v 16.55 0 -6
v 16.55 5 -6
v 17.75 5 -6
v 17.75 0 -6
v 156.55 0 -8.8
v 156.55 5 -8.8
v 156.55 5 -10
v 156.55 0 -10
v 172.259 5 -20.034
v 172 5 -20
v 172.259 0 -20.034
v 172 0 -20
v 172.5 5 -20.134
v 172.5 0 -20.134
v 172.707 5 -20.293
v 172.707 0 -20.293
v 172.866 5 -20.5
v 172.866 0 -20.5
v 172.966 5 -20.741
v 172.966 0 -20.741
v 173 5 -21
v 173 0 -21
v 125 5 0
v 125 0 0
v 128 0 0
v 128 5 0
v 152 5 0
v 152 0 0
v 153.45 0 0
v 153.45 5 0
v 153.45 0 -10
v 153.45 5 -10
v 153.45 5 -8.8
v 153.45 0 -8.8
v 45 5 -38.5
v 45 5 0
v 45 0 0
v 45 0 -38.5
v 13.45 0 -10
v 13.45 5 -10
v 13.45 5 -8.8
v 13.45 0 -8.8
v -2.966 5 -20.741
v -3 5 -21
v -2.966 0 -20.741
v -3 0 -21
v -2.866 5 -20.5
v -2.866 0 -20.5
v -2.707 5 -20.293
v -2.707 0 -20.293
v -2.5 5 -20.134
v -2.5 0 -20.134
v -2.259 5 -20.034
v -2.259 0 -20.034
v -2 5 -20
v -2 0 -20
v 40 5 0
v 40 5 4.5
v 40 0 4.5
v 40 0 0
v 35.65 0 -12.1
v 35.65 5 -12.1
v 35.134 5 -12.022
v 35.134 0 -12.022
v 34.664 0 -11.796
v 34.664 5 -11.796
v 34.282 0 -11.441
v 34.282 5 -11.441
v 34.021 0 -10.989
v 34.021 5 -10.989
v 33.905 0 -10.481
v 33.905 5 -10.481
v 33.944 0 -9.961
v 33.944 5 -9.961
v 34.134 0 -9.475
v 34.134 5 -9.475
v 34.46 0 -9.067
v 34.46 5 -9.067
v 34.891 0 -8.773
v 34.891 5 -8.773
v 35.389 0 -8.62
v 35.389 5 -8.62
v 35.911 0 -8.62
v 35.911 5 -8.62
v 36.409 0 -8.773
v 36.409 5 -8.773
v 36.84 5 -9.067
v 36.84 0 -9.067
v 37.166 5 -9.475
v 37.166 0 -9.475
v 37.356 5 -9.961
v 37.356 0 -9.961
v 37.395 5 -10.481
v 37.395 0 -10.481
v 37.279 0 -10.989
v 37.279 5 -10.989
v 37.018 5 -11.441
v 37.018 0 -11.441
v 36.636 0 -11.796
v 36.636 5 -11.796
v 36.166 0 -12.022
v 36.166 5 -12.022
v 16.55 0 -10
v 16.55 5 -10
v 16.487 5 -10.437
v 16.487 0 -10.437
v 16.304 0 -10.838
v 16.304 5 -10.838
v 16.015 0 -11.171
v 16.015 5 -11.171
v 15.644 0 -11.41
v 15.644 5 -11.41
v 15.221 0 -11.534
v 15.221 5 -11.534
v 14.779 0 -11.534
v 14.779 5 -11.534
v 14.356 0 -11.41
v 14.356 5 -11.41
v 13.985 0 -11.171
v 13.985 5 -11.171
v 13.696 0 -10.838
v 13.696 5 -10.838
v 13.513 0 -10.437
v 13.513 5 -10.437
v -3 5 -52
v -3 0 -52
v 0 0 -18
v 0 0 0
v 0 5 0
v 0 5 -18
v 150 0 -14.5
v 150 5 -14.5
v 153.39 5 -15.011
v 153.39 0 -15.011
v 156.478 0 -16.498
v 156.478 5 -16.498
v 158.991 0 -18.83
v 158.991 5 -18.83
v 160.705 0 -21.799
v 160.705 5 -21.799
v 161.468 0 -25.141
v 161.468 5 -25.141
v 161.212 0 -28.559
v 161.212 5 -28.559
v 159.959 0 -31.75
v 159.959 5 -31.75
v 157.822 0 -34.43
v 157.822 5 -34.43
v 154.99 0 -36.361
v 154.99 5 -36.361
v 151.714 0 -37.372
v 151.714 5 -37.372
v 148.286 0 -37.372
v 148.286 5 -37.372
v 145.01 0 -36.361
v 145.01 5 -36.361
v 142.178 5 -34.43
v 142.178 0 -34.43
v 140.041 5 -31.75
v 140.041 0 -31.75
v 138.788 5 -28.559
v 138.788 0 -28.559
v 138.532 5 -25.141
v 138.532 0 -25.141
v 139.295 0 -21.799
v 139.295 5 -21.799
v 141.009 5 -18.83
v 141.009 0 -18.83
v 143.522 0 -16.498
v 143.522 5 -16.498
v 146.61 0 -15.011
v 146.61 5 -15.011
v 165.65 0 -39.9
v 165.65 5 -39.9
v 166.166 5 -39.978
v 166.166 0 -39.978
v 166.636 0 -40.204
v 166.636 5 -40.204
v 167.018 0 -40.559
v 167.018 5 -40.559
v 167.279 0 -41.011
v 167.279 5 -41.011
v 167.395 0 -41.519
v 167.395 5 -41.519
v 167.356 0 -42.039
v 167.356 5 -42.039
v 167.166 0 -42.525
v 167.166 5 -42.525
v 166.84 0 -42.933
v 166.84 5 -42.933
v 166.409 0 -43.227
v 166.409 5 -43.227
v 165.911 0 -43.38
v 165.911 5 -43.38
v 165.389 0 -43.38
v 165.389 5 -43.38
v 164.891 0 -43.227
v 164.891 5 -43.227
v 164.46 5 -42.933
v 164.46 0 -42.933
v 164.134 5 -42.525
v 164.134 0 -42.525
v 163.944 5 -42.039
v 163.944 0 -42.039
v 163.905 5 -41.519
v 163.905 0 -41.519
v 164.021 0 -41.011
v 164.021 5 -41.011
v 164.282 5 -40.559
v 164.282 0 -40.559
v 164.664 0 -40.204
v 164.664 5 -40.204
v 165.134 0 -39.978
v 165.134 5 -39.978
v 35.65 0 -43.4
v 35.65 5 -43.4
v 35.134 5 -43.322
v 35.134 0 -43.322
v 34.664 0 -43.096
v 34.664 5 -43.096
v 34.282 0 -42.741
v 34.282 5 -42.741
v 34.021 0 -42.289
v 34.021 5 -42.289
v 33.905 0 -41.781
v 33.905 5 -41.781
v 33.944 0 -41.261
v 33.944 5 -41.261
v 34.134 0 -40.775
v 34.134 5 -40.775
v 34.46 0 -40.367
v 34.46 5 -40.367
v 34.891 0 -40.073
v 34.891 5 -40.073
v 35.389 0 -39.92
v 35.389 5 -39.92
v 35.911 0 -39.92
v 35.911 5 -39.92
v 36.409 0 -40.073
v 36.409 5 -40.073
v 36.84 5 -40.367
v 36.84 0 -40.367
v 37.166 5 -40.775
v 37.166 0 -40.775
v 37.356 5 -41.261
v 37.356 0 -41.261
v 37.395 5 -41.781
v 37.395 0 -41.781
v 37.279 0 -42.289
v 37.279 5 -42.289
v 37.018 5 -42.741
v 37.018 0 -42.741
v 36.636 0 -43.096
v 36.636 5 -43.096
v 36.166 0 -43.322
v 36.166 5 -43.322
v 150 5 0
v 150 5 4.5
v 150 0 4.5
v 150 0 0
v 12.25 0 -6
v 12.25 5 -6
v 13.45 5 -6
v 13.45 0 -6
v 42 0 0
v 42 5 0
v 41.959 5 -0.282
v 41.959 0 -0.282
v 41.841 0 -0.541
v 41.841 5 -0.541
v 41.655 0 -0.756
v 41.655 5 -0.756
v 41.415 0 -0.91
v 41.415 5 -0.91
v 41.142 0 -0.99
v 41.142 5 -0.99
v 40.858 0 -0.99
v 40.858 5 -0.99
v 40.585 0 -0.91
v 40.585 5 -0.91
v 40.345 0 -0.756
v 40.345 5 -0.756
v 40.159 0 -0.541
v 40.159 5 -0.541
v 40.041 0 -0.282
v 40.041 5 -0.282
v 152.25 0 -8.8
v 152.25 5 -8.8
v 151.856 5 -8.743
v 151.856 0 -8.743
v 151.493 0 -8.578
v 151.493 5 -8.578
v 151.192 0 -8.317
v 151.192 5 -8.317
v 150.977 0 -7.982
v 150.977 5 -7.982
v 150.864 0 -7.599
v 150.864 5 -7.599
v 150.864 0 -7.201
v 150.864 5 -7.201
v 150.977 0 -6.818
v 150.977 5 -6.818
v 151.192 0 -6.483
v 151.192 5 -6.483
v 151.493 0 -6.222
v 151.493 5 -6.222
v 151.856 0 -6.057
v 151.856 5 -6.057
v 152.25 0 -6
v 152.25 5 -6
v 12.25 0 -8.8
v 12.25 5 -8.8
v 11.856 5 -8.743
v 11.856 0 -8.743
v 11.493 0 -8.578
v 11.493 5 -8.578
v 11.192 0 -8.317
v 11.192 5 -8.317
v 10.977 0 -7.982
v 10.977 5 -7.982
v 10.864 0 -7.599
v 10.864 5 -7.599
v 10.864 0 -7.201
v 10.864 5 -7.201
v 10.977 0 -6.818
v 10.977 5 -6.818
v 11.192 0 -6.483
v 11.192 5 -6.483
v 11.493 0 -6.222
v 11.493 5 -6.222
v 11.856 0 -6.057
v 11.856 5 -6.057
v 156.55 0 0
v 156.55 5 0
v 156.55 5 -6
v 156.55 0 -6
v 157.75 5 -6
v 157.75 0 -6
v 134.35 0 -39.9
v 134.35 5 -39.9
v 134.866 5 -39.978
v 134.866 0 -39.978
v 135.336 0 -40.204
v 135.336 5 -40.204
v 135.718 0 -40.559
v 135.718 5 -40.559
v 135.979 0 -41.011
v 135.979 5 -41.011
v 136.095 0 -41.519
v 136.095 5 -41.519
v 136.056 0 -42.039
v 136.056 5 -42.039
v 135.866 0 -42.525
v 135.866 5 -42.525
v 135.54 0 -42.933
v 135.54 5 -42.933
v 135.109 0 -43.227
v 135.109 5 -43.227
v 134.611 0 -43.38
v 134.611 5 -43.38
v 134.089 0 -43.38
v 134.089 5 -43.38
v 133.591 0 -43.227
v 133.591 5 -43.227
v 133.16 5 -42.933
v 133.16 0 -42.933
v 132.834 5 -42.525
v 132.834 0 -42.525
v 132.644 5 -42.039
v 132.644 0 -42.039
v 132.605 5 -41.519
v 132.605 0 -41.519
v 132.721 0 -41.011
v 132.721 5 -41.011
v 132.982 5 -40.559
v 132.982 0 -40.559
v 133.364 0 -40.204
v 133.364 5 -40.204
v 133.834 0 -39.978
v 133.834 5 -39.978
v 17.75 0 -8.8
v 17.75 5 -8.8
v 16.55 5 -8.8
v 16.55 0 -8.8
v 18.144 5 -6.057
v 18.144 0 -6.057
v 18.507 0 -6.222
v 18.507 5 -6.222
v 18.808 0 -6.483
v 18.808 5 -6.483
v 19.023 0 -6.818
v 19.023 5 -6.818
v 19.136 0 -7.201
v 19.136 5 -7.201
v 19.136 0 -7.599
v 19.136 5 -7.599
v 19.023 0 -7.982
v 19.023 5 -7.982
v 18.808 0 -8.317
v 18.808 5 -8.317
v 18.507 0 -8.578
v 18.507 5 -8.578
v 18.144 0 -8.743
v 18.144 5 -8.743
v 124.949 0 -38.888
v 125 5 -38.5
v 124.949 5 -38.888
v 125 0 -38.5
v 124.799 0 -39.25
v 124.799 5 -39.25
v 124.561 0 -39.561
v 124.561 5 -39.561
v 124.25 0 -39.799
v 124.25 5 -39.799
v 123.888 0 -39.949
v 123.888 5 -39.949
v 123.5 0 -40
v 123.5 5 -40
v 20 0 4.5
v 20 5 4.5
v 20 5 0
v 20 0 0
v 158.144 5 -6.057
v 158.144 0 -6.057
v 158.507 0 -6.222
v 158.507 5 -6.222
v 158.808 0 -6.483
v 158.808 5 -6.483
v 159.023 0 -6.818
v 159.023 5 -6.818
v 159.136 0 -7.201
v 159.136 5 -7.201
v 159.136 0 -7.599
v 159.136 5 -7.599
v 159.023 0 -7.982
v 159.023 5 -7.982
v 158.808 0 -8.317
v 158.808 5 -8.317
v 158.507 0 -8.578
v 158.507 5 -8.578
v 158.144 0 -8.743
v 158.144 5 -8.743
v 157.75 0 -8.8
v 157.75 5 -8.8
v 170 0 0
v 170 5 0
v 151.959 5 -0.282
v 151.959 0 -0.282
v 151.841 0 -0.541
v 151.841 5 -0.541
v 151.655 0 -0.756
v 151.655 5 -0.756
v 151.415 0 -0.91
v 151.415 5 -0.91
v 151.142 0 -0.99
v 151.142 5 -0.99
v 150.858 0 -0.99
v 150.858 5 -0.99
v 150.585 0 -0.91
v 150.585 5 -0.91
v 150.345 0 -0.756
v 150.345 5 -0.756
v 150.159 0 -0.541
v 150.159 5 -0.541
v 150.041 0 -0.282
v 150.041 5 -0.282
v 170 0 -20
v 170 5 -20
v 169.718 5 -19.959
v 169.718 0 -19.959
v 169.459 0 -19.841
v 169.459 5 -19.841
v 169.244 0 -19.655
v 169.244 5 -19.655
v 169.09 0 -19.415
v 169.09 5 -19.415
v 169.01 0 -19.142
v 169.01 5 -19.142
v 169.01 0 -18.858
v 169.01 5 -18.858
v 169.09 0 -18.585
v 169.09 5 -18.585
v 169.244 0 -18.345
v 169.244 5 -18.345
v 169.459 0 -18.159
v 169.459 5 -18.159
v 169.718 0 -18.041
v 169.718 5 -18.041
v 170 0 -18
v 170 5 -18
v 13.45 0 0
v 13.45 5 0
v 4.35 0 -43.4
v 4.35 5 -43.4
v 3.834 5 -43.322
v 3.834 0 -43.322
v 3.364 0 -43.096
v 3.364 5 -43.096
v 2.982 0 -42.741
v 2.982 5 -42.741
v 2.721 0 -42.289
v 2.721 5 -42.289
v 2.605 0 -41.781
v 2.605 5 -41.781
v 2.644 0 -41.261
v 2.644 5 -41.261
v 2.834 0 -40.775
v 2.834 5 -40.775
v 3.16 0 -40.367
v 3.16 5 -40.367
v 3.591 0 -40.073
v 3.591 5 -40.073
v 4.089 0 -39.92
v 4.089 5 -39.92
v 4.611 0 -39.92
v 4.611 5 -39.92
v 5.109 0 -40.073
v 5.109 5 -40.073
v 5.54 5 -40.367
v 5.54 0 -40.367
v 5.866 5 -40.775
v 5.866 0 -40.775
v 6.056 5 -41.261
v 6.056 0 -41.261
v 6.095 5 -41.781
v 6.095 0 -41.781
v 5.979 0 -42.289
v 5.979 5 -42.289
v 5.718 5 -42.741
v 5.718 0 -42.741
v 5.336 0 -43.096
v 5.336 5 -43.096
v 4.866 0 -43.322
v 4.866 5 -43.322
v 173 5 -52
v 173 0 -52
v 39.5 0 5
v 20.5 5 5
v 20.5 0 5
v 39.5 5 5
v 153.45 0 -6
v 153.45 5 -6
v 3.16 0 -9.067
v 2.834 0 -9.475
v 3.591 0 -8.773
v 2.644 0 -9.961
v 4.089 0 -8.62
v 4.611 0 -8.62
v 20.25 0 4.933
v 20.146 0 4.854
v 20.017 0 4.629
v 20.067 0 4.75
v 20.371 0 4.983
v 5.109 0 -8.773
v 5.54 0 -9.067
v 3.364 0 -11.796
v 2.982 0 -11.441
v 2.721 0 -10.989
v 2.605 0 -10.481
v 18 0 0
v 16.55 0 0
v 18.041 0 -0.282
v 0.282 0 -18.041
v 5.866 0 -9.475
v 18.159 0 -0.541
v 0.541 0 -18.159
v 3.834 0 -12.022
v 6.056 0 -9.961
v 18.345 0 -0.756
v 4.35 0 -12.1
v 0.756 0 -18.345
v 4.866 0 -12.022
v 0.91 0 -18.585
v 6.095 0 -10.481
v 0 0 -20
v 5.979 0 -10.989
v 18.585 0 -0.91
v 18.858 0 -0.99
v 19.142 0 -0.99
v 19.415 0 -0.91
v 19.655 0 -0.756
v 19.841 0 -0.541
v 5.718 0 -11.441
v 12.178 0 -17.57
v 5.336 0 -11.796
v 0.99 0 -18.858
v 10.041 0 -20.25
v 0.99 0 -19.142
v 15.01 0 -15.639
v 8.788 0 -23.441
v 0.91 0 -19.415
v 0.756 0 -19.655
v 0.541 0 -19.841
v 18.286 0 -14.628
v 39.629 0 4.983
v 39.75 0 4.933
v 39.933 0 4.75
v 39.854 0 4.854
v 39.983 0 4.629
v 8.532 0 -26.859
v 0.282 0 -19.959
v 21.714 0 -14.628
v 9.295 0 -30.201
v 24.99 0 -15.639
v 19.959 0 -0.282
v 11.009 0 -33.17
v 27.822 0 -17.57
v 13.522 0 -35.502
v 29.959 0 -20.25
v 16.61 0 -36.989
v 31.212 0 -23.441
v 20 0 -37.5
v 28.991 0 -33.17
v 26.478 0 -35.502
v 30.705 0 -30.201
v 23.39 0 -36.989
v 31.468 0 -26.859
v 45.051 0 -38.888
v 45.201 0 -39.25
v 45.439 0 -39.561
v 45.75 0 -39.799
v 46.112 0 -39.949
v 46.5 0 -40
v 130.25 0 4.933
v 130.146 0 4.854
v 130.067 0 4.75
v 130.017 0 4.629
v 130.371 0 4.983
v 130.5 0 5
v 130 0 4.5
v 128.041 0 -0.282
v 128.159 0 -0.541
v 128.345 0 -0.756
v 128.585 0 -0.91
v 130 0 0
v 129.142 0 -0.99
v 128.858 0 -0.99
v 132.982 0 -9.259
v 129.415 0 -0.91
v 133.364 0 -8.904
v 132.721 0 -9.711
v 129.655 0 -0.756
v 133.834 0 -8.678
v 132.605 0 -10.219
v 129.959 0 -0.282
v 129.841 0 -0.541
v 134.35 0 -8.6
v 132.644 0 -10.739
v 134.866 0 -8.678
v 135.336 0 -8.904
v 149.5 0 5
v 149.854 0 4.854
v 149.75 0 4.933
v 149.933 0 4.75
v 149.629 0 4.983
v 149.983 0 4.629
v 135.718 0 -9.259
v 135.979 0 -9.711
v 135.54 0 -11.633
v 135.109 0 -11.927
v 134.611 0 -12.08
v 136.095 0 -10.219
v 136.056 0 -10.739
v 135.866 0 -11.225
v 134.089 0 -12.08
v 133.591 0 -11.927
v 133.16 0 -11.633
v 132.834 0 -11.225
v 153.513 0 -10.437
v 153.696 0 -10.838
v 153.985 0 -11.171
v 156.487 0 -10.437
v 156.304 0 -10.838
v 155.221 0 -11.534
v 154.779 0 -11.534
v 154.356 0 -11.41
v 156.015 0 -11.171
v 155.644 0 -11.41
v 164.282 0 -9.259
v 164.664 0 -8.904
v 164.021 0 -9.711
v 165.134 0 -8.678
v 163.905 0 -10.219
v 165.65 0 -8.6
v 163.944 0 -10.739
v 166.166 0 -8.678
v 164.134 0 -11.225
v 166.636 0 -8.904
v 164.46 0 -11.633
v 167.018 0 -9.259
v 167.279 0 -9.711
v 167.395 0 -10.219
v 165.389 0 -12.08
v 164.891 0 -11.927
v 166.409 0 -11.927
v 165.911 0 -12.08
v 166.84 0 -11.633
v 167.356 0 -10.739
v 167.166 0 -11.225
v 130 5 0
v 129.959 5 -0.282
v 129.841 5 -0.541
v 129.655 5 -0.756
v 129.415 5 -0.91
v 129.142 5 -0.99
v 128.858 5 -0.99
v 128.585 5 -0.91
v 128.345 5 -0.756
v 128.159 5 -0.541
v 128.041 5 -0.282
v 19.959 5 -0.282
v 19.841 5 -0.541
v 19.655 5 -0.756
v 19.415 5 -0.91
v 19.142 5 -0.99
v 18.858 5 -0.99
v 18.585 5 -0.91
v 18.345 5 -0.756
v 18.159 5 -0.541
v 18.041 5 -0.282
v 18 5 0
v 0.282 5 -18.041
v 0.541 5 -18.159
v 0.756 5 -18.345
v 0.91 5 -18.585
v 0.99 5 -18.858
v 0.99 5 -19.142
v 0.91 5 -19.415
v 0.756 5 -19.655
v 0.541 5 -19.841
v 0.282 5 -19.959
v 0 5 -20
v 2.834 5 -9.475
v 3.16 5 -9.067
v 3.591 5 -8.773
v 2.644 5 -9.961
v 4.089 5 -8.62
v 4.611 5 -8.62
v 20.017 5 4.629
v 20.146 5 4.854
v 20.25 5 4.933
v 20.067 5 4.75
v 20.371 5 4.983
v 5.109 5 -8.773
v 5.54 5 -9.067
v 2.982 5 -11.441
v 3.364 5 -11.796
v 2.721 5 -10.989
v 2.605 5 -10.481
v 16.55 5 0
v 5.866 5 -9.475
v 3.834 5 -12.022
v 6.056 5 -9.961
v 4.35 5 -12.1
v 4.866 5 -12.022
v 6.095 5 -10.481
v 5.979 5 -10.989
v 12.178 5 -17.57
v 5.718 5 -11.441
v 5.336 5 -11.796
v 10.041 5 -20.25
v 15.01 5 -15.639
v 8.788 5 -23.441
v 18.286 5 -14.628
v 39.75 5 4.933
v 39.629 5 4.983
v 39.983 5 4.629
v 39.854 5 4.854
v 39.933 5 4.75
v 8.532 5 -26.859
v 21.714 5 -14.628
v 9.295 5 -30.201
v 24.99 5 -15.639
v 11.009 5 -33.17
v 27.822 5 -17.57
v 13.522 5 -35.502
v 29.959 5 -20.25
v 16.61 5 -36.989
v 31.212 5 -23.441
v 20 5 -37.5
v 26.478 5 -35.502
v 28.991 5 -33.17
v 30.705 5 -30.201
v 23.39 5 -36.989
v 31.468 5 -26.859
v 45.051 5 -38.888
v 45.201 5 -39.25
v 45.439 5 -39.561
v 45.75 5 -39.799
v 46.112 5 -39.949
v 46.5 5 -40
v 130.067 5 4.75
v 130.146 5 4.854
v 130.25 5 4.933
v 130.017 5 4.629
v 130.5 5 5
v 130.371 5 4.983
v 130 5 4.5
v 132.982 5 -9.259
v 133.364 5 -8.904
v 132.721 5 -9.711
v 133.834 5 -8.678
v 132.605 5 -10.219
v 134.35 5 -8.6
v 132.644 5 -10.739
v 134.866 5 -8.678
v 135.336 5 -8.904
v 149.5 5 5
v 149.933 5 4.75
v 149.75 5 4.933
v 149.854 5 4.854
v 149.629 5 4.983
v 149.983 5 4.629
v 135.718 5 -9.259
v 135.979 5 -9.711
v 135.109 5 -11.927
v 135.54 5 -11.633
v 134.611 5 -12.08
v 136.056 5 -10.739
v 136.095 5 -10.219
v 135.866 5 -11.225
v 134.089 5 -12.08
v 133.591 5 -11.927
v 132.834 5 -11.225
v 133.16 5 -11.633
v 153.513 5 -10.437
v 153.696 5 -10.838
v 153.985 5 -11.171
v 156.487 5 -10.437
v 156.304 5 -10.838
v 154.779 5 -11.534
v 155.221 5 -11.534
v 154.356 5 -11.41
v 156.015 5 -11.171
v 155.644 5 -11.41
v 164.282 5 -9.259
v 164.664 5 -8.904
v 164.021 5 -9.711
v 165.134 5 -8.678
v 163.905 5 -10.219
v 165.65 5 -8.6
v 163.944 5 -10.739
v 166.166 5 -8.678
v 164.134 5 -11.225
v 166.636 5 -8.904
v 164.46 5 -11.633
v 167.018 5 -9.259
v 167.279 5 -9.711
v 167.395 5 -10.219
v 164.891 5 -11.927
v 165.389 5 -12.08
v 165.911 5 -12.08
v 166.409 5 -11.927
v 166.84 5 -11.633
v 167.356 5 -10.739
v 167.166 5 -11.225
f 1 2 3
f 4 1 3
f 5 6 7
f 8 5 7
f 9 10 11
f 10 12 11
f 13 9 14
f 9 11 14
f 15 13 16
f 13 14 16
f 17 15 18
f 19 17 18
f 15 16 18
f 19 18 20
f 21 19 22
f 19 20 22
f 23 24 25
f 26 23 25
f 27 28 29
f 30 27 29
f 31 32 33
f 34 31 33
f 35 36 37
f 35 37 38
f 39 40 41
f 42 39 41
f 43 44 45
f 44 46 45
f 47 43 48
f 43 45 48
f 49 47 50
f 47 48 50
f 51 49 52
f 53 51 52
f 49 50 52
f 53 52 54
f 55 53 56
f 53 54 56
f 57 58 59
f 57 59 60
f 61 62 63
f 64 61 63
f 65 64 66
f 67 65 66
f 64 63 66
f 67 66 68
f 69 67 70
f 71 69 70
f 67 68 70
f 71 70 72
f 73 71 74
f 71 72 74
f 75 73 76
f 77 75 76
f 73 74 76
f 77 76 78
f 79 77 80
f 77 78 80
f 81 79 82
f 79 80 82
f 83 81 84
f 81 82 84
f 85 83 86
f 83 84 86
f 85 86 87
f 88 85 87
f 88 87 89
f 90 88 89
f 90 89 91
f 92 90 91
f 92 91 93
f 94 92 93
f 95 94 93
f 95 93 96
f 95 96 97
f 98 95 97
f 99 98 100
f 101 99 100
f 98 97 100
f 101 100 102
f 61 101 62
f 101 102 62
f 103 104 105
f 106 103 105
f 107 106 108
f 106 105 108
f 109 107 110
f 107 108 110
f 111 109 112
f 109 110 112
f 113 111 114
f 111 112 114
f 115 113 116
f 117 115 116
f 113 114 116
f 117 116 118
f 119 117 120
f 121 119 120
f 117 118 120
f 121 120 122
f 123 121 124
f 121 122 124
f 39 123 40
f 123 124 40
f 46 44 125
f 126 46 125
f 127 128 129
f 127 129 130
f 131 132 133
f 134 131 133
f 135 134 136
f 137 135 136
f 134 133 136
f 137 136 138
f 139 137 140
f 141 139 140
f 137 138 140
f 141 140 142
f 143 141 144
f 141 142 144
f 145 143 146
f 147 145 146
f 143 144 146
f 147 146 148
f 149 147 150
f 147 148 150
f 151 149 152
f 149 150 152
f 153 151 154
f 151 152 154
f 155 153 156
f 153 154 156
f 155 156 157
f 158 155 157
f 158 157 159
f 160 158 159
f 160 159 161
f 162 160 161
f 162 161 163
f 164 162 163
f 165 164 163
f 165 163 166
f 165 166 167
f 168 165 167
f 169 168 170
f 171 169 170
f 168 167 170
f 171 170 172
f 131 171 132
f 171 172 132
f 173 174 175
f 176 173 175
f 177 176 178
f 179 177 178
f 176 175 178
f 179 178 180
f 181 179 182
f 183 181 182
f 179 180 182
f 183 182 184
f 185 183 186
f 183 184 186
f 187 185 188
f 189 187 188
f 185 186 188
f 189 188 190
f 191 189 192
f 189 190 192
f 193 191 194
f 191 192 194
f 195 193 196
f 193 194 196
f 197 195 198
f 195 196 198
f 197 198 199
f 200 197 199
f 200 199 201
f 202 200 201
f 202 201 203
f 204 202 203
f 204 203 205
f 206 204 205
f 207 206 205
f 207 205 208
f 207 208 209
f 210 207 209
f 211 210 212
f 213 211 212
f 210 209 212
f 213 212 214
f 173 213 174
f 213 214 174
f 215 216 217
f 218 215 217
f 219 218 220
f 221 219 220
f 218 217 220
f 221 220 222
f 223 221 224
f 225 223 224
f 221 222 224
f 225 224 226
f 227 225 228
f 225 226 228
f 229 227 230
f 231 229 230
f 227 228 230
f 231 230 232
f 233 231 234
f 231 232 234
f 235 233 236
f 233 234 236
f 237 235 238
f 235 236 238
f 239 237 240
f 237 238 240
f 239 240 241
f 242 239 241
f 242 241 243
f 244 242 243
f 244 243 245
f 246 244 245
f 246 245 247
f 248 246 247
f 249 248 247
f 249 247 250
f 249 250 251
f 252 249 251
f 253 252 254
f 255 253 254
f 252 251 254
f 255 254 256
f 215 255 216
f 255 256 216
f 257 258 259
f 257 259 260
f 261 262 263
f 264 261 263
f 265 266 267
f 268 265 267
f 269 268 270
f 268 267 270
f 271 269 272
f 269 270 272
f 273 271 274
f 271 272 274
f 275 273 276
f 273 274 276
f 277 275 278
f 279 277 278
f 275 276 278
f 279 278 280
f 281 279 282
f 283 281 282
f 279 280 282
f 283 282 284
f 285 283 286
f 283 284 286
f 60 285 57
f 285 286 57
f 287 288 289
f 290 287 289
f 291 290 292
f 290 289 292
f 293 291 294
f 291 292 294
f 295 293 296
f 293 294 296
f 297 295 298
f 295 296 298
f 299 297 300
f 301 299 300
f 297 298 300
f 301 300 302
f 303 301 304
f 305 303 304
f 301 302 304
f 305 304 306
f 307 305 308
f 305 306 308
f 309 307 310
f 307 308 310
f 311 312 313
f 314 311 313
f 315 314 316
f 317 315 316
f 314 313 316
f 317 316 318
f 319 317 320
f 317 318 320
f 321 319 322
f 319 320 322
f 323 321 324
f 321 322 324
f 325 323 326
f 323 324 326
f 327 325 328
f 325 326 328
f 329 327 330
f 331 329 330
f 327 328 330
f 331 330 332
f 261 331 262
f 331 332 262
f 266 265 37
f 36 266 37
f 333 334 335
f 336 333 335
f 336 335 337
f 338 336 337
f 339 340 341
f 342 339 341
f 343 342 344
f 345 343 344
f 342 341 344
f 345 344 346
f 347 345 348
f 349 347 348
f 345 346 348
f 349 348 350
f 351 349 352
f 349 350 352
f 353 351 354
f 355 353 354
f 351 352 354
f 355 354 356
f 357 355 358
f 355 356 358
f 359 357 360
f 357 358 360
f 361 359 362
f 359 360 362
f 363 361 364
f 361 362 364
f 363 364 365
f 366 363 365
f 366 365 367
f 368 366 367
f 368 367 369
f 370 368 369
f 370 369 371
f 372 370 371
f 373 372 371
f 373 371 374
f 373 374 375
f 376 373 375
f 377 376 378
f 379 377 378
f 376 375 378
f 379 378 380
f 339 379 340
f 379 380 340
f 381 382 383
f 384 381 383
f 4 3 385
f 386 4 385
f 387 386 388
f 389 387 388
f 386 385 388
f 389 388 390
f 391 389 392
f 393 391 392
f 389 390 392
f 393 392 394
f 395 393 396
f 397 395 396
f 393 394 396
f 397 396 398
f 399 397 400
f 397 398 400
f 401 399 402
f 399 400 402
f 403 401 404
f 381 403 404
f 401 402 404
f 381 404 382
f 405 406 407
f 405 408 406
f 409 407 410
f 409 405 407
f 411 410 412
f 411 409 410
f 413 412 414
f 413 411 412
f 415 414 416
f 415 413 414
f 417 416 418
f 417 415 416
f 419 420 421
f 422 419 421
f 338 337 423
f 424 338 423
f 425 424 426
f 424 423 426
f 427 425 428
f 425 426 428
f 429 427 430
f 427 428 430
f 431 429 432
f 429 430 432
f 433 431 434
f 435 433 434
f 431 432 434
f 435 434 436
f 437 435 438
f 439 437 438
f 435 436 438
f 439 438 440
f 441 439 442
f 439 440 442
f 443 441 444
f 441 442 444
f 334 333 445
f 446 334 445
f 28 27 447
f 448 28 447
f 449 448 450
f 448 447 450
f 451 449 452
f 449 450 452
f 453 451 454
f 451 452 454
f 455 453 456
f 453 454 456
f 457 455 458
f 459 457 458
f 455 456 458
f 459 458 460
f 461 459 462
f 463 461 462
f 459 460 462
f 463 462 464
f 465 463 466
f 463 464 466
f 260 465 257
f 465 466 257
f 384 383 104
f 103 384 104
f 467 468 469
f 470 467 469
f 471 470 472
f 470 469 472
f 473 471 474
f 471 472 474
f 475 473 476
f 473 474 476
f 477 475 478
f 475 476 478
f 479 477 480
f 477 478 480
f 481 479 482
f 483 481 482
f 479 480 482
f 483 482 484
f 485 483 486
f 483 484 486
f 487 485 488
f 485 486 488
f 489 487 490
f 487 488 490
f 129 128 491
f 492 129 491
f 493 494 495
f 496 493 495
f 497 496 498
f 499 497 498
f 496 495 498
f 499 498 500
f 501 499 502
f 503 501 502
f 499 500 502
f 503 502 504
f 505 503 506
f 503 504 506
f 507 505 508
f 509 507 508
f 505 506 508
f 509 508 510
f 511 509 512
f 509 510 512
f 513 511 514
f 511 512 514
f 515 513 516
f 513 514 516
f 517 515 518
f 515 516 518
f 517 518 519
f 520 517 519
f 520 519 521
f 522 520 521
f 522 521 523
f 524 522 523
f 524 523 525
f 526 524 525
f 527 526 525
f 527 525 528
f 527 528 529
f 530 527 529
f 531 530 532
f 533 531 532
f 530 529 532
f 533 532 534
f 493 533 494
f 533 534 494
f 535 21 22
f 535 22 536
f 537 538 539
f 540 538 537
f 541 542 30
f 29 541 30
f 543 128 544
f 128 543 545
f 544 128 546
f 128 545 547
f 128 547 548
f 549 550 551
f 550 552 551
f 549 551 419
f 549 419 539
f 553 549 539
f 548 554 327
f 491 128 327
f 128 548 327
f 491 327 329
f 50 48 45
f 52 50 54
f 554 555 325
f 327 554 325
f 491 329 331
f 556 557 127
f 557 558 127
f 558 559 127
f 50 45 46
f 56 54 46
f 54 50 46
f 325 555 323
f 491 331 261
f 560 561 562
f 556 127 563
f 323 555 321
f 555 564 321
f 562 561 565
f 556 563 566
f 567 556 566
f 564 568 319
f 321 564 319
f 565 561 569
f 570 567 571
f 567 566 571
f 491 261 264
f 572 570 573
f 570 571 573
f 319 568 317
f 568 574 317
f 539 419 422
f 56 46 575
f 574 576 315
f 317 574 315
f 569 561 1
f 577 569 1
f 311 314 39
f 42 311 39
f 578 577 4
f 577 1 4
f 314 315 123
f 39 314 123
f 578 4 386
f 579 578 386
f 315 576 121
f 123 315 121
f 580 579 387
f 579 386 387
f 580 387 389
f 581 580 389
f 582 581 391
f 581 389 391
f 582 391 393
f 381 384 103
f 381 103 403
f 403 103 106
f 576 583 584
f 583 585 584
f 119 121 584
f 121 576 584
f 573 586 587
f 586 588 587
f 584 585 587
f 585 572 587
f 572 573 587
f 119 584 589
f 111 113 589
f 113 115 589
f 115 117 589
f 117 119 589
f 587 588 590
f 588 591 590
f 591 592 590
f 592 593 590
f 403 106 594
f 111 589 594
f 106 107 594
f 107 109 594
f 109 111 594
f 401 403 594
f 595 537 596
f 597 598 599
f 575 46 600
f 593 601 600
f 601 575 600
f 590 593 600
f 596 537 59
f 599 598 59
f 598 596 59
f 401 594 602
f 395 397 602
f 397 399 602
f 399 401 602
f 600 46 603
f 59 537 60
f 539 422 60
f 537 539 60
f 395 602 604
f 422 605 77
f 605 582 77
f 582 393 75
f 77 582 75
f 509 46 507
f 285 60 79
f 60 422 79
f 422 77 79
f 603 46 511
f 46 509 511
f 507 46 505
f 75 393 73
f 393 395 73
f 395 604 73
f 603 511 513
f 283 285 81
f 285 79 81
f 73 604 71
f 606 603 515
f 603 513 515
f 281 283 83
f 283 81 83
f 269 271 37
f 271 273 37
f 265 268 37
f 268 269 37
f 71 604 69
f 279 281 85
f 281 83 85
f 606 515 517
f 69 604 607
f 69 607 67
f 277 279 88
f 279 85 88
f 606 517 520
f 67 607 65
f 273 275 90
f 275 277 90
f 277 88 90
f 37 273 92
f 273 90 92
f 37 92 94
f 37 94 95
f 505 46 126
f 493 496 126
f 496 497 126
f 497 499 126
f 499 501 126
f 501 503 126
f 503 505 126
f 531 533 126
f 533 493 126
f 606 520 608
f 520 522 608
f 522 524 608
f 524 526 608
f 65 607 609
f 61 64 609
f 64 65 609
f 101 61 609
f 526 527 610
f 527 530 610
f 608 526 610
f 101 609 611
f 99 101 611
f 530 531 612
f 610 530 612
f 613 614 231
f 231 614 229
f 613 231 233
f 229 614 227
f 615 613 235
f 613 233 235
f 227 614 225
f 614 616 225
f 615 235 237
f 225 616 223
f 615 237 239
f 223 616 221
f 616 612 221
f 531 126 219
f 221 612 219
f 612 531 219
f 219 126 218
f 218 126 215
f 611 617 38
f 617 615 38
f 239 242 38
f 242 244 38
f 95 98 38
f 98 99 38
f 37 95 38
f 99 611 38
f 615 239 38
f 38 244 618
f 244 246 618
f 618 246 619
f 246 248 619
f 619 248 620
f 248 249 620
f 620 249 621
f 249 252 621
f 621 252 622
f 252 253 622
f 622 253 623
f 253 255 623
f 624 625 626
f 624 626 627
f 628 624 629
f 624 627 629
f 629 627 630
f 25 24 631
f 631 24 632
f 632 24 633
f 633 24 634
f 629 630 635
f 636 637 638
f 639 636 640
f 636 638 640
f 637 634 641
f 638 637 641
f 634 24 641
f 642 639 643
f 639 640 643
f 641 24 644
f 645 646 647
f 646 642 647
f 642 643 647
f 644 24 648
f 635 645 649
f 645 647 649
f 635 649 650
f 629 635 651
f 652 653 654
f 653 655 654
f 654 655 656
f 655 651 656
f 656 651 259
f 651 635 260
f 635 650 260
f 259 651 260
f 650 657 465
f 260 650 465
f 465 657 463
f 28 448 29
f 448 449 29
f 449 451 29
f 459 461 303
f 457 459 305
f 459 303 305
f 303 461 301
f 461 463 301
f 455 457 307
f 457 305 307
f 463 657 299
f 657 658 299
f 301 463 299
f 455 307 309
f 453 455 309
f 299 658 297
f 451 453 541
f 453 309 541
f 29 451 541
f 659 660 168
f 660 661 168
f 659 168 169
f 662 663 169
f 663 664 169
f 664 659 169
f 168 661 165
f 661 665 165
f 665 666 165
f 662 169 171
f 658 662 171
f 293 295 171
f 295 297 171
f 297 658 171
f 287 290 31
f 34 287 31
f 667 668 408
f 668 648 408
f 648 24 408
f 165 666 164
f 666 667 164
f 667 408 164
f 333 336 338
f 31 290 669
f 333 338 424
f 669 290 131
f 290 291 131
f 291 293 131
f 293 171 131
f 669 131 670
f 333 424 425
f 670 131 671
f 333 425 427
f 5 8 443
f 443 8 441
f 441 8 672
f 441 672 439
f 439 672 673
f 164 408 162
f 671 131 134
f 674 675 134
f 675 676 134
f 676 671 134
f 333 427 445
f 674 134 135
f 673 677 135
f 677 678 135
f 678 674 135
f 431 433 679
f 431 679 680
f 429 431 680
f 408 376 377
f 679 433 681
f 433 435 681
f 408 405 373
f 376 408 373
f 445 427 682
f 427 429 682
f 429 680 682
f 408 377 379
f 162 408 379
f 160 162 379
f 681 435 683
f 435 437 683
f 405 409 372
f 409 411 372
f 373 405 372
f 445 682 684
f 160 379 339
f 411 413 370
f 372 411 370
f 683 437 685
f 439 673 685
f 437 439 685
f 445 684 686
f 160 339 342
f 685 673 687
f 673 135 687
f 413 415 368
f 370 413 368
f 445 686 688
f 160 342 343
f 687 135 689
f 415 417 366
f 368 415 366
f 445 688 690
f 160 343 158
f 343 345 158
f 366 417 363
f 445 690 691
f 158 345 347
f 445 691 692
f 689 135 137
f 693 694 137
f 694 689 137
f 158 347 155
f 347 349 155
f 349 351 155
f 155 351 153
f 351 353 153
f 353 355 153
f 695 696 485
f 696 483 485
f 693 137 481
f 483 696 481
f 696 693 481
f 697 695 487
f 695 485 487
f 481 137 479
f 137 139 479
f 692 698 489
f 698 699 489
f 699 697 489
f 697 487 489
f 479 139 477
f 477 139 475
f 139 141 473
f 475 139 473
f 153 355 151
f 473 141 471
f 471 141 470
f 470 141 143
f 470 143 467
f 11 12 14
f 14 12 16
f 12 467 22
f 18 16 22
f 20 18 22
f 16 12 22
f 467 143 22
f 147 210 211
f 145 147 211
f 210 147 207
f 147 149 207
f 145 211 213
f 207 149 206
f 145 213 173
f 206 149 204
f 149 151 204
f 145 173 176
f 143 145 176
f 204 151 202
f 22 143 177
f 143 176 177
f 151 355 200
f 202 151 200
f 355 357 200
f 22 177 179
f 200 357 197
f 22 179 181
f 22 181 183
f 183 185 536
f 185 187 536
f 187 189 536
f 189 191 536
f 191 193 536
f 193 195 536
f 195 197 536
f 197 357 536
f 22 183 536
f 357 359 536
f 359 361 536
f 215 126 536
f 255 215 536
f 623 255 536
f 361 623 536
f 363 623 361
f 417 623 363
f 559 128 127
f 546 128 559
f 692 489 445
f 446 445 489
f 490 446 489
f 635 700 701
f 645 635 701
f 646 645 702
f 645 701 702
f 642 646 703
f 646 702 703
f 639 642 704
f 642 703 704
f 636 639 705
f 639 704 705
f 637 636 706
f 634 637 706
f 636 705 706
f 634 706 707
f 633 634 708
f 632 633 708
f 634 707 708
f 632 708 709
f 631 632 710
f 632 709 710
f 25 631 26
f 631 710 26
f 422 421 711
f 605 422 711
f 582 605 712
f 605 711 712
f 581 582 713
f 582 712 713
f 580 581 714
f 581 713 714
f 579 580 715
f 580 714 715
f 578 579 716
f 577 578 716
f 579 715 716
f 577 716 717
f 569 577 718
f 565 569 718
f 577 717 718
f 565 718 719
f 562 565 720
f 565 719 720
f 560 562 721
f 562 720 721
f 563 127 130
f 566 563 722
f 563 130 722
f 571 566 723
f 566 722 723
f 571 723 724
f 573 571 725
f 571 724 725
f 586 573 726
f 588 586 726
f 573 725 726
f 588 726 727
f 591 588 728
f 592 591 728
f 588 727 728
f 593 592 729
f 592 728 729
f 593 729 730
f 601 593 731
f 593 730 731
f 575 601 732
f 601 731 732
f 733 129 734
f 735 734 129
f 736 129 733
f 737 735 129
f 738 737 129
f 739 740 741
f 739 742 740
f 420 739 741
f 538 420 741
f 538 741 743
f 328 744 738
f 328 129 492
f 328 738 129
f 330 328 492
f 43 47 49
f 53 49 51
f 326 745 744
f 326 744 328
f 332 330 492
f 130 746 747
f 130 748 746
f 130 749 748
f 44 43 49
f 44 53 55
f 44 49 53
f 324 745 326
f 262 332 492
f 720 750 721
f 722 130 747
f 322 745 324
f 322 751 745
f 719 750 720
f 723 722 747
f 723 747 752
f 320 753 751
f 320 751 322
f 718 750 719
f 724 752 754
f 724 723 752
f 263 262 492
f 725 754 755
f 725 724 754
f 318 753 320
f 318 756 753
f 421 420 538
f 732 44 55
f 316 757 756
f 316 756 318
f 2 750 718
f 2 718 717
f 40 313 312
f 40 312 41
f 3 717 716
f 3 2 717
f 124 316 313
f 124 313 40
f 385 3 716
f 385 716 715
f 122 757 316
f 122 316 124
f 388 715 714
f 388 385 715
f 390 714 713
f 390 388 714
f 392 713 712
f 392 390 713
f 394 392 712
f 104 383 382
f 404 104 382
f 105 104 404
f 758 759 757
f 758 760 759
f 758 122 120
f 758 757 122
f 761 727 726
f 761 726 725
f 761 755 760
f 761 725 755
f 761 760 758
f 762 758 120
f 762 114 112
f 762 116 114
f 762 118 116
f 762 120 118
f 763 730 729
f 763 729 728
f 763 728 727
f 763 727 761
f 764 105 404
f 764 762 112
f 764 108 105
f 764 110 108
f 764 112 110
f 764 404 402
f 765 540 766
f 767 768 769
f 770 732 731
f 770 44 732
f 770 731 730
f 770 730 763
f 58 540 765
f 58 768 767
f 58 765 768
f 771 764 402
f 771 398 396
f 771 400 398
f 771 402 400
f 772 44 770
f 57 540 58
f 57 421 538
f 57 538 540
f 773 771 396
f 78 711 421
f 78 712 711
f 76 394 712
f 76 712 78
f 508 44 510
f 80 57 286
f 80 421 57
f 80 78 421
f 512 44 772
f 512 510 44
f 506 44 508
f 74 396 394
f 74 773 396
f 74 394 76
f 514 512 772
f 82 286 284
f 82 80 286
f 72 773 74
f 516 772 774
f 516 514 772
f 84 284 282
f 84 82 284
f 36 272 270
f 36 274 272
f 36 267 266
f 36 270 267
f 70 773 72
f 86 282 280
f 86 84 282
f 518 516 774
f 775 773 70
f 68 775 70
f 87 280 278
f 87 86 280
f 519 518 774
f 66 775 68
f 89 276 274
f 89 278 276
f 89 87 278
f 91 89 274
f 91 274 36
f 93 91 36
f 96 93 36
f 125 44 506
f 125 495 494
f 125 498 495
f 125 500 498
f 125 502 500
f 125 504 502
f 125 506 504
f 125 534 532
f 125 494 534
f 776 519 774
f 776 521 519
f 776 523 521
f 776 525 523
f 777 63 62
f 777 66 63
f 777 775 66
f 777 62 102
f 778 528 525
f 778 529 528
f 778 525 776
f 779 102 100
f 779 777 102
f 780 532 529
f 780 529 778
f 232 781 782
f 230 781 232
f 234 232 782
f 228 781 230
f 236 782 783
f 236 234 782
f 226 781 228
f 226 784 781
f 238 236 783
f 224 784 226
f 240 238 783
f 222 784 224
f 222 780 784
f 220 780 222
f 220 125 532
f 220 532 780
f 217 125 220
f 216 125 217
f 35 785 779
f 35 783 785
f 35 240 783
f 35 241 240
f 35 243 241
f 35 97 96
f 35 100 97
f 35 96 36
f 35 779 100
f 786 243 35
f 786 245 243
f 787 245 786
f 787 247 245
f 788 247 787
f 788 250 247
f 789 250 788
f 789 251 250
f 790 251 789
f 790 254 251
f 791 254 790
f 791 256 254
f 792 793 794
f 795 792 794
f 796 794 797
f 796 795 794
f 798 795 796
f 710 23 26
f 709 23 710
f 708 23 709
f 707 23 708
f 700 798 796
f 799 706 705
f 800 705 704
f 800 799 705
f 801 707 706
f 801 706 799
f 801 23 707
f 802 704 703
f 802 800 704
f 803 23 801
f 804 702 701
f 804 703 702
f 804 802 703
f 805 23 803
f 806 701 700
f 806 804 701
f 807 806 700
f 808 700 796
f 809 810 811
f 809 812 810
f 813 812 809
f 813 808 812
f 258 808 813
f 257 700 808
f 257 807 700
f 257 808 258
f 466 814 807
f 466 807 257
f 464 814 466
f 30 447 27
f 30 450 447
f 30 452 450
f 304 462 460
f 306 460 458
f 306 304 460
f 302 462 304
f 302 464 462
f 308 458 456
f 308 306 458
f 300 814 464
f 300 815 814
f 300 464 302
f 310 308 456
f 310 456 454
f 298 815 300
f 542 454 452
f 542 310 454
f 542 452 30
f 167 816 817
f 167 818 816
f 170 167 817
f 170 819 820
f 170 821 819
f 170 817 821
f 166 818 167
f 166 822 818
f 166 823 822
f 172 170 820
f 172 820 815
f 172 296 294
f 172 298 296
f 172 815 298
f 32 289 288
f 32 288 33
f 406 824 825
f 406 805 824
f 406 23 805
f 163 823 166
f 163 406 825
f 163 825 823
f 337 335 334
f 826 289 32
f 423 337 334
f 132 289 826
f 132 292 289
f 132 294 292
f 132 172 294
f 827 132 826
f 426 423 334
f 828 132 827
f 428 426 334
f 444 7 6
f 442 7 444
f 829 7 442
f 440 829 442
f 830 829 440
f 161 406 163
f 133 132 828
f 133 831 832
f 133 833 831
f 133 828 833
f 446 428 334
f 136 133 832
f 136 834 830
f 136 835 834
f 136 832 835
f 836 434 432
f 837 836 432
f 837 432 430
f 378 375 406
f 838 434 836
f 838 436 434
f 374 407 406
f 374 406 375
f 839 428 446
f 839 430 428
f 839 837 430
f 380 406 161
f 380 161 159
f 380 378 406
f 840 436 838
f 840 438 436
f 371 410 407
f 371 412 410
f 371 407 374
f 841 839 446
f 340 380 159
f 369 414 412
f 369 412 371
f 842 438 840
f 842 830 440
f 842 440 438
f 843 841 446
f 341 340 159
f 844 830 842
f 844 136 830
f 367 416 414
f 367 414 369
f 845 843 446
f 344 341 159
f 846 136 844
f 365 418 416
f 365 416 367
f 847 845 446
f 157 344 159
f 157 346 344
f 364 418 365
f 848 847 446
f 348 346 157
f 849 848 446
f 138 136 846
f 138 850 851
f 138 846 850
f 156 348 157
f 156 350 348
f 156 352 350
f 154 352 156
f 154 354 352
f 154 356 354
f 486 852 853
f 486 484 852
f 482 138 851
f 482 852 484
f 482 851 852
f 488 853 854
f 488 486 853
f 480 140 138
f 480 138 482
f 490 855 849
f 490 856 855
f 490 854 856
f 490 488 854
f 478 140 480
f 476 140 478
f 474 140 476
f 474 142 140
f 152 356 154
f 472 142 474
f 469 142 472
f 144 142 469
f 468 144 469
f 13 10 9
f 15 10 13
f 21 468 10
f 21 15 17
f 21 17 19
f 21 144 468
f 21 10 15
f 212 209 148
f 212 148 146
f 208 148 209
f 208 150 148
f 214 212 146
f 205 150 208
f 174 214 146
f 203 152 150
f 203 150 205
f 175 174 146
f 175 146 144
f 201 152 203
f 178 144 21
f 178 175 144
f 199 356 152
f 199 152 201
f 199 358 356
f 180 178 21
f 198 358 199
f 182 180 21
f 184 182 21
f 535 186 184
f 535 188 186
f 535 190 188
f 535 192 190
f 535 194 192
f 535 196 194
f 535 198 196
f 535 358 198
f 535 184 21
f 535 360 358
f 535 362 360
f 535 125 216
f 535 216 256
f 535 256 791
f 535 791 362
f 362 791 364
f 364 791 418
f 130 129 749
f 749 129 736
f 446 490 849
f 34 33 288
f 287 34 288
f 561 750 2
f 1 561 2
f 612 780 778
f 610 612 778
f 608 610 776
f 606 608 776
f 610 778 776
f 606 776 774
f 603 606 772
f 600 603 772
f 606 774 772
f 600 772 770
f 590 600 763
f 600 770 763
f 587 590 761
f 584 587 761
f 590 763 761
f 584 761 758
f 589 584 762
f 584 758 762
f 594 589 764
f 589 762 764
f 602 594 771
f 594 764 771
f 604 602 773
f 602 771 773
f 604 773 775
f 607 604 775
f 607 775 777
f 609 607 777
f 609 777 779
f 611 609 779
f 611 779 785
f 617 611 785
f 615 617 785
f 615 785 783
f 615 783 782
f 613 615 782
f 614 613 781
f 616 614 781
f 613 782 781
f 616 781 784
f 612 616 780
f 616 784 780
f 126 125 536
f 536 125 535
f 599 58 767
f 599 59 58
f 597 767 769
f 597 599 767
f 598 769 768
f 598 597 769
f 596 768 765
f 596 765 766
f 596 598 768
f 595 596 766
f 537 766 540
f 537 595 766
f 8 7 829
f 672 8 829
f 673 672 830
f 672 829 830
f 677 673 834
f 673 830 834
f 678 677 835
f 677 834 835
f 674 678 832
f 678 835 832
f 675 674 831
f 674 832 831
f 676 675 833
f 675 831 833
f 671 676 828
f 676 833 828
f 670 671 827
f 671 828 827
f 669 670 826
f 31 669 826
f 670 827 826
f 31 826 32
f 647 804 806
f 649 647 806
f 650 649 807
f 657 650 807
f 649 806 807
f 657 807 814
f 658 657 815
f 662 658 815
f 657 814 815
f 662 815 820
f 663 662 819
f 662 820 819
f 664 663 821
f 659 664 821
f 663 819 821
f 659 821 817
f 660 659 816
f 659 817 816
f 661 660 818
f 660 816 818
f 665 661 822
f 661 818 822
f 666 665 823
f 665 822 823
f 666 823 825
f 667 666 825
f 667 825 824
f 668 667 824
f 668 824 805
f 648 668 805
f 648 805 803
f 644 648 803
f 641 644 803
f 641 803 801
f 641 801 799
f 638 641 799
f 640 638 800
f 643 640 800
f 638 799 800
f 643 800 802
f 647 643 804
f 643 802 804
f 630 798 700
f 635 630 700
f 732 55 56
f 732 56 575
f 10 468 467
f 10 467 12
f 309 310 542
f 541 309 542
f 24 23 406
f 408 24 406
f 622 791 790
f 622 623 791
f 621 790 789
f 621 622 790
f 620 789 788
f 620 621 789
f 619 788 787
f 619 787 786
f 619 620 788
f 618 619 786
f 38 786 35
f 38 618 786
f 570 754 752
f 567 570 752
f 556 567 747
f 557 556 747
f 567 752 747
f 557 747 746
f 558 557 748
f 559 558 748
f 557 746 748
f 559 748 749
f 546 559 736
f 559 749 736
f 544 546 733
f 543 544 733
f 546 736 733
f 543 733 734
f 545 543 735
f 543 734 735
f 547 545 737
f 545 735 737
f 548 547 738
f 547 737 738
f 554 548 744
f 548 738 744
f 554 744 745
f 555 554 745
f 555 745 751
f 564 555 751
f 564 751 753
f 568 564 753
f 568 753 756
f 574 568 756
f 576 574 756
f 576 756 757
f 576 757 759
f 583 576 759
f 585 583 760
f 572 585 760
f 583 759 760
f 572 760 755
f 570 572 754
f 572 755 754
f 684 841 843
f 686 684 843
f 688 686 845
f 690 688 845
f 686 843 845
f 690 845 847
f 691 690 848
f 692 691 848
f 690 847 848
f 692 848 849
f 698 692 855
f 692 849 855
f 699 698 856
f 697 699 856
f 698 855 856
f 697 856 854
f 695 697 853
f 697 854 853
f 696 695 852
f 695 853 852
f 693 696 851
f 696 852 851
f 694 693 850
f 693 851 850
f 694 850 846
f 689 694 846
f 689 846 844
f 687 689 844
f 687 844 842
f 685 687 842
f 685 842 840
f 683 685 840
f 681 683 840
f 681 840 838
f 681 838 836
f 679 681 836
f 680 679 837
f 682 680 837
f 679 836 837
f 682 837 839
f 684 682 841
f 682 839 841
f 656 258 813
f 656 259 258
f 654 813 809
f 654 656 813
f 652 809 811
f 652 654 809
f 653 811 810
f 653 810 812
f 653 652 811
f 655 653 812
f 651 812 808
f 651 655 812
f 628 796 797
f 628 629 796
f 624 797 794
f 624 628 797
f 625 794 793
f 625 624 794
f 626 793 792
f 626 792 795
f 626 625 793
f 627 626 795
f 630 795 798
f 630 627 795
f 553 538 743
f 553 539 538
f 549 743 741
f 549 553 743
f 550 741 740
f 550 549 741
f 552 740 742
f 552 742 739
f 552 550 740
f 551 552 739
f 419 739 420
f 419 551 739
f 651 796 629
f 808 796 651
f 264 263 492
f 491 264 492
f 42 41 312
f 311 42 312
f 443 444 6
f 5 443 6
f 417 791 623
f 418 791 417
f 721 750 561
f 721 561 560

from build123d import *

# Parameters (mm, degrees)
SKETCH_1_W          = 170
SKETCH_1_H          = 52
EXTRUDE_1_DEPTH     = 5
SKETCH_2_R          = 11.5
SKETCH_2_R_2        = 1.75
CUT_EXTRUDE_1_DEPTH = 5
SKETCH_3_W          = 20
SKETCH_3_H          = 5
EXTRUDE_2_DEPTH     = 5
SKETCH_4_R          = 1
CUT_EXTRUDE_2_DEPTH = 5
CUT_EXTRUDE_3_DEPTH = 10
FILLET_1_R          = 0.5
SKETCH_7_W          = 3
SKETCH_7_H          = 32
EXTRUDE_3_DEPTH     = 5
SKETCH_8_R          = 1
CUT_EXTRUDE_5_DEPTH = 5
SKETCH_9_W          = 80
SKETCH_9_H          = 40
CUT_EXTRUDE_6_DEPTH = 10
FILLET_2_R          = 1.5
FILLET_3_R          = 1


with BuildPart() as part:
    # 스케치1 → 보스-돌출1 (new body)
    with BuildSketch(Plane(origin=(0, 0, 0), x_dir=(1, 0, 0), z_dir=(0, 1, 0))):
        with Locations((85, 26)):
            Rectangle(SKETCH_1_W, SKETCH_1_H)
    extrude(amount=EXTRUDE_1_DEPTH)

    # 스케치2 → 컷-돌출1 (cut)
    with BuildSketch(Plane(origin=(0, 5, 0), x_dir=(1, 0, 0), z_dir=(0, 1, 0))):
        with Locations(Location((150, 26, 0), (0, 0, 270))):
            Circle(SKETCH_2_R)
        with Locations(Location((165.65, 41.65, 0), (0, 0, 270))):
            Circle(SKETCH_2_R_2)
        with Locations(Location((134.35, 41.65, 0), (0, 0, 270))):
            Circle(SKETCH_2_R_2)
        with Locations(Location((165.65, 10.35, 0), (0, 0, 270))):
            Circle(SKETCH_2_R_2)
        with Locations(Location((134.35, 10.35, 0), (0, 0, 270))):
            Circle(SKETCH_2_R_2)
        with Locations(Location((35.65, 10.35, 0), (0, 0, 90))):
            Circle(SKETCH_2_R_2)
        with Locations(Location((4.35, 10.35, 0), (0, 0, 90))):
            Circle(SKETCH_2_R_2)
        with Locations(Location((35.65, 41.65, 0), (0, 0, 90))):
            Circle(SKETCH_2_R_2)
        with Locations(Location((4.35, 41.65, 0), (0, 0, 90))):
            Circle(SKETCH_2_R_2)
        with Locations(Location((20, 26, 0), (0, 0, 90))):
            Circle(SKETCH_2_R)
    extrude(amount=-CUT_EXTRUDE_1_DEPTH, mode=Mode.SUBTRACT)

    # 스케치3 → 보스-돌출2 (add)
    with BuildSketch(Plane(origin=(0, 5, 0), x_dir=(1, 0, 0), z_dir=(0, 1, 0))):
        with Locations((140, -2.5)):
            Rectangle(SKETCH_3_W, SKETCH_3_H)
        with Locations((30, -2.5)):
            Rectangle(SKETCH_3_W, SKETCH_3_H)
    extrude(amount=-EXTRUDE_2_DEPTH)

    # 스케치4 → 컷-돌출2 (cut)
    with BuildSketch(Plane(origin=(0, 5, 0), x_dir=(1, 0, 0), z_dir=(0, 1, 0))):
        with Locations((129, 0)):
            Circle(SKETCH_4_R)
        with Locations((151, 0)):
            Circle(SKETCH_4_R)
        with Locations((19, 0)):
            Circle(SKETCH_4_R)
        with Locations((41, 0)):
            Circle(SKETCH_4_R)
    extrude(amount=-CUT_EXTRUDE_2_DEPTH, mode=Mode.SUBTRACT)

    # 스케치5 → 컷-돌출3 (cut)
    with BuildSketch(Plane(origin=(0, 5, 0), x_dir=(1, 0, 0), z_dir=(0, 1, 0))):
        with BuildLine():
            Line((156.55, 0), (156.55, 6))
            Line((156.55, 6), (157.75, 6))
            ThreePointArc((157.75, 6), (159.15, 7.4), (157.75, 8.8))
            Line((157.75, 8.8), (156.55, 8.8))
            Line((156.55, 8.8), (156.55, 10))
            ThreePointArc((156.55, 10), (155, 11.55), (153.45, 10))
            Line((153.45, 10), (153.45, 8.8))
            Line((153.45, 8.8), (152.25, 8.8))
            ThreePointArc((152.25, 8.8), (150.85, 7.4), (152.25, 6))
            Line((152.25, 6), (153.45, 6))
            Line((153.45, 6), (153.45, 0))
            Line((153.45, 0), (156.55, 0))
        make_face()
        with BuildLine():
            Line((12.25, 6), (13.45, 6))
            Line((13.45, 6), (13.45, 0))
            Line((13.45, 0), (16.55, 0))
            Line((16.55, 0), (16.55, 6))
            Line((16.55, 6), (17.75, 6))
            ThreePointArc((17.75, 6), (19.15, 7.4), (17.75, 8.8))
            Line((17.75, 8.8), (16.55, 8.8))
            Line((16.55, 8.8), (16.55, 10))
            ThreePointArc((16.55, 10), (15, 11.55), (13.45, 10))
            Line((13.45, 10), (13.45, 8.8))
            Line((13.45, 8.8), (12.25, 8.8))
            ThreePointArc((12.25, 8.8), (10.85, 7.4), (12.25, 6))
        make_face()
    extrude(amount=-CUT_EXTRUDE_3_DEPTH, mode=Mode.SUBTRACT)

    # 필렛1
    fillet_1_edges = [part.edges().sort_by_distance(p)[0] for p in [
        (20, 2.5, 5),
        (130, 2.5, 5),
        (150, 2.5, 5),
        (40, 2.5, 5),
    ]]
    fillet(fillet_1_edges, radius=FILLET_1_R)

    # 스케치7 → 보스-돌출3 (add)
    with BuildSketch(Plane(origin=(0, 5, 0), x_dir=(1, 0, 0), z_dir=(0, 1, 0))):
        with Locations((171.5, 36)):
            Rectangle(SKETCH_7_W, SKETCH_7_H)
        with Locations((-1.5, 36)):
            Rectangle(SKETCH_7_W, SKETCH_7_H)
    extrude(amount=-EXTRUDE_3_DEPTH)

    # 스케치8 → 컷-돌출5 (cut)
    with BuildSketch(Plane(origin=(0, 5, 0), x_dir=(1, 0, 0), z_dir=(0, 1, 0))):
        with Locations((170, 19)):
            Circle(SKETCH_8_R)
        with Locations((0, 19)):
            Circle(SKETCH_8_R)
    extrude(amount=-CUT_EXTRUDE_5_DEPTH, mode=Mode.SUBTRACT)

    # 스케치9 → 컷-돌출6 (cut)
    with BuildSketch(Plane(origin=(0, 5, 0), x_dir=(1, 0, 0), z_dir=(0, 1, 0))):
        with Locations((85, 20)):
            Rectangle(SKETCH_9_W, SKETCH_9_H)
    extrude(amount=-CUT_EXTRUDE_6_DEPTH, mode=Mode.SUBTRACT)

    # 필렛2
    fillet_2_edges = [part.edges().sort_by_distance(p)[0] for p in [
        (125, 2.5, -40),
        (45, 2.5, -40),
    ]]
    fillet(fillet_2_edges, radius=FILLET_2_R)

    # 필렛3
    fillet_3_edges = [part.edges().sort_by_distance(p)[0] for p in [
        (173, 2.5, -20),
        (-3, 2.5, -20),
    ]]
    fillet(fillet_3_edges, radius=FILLET_3_R)


solid = part.part
